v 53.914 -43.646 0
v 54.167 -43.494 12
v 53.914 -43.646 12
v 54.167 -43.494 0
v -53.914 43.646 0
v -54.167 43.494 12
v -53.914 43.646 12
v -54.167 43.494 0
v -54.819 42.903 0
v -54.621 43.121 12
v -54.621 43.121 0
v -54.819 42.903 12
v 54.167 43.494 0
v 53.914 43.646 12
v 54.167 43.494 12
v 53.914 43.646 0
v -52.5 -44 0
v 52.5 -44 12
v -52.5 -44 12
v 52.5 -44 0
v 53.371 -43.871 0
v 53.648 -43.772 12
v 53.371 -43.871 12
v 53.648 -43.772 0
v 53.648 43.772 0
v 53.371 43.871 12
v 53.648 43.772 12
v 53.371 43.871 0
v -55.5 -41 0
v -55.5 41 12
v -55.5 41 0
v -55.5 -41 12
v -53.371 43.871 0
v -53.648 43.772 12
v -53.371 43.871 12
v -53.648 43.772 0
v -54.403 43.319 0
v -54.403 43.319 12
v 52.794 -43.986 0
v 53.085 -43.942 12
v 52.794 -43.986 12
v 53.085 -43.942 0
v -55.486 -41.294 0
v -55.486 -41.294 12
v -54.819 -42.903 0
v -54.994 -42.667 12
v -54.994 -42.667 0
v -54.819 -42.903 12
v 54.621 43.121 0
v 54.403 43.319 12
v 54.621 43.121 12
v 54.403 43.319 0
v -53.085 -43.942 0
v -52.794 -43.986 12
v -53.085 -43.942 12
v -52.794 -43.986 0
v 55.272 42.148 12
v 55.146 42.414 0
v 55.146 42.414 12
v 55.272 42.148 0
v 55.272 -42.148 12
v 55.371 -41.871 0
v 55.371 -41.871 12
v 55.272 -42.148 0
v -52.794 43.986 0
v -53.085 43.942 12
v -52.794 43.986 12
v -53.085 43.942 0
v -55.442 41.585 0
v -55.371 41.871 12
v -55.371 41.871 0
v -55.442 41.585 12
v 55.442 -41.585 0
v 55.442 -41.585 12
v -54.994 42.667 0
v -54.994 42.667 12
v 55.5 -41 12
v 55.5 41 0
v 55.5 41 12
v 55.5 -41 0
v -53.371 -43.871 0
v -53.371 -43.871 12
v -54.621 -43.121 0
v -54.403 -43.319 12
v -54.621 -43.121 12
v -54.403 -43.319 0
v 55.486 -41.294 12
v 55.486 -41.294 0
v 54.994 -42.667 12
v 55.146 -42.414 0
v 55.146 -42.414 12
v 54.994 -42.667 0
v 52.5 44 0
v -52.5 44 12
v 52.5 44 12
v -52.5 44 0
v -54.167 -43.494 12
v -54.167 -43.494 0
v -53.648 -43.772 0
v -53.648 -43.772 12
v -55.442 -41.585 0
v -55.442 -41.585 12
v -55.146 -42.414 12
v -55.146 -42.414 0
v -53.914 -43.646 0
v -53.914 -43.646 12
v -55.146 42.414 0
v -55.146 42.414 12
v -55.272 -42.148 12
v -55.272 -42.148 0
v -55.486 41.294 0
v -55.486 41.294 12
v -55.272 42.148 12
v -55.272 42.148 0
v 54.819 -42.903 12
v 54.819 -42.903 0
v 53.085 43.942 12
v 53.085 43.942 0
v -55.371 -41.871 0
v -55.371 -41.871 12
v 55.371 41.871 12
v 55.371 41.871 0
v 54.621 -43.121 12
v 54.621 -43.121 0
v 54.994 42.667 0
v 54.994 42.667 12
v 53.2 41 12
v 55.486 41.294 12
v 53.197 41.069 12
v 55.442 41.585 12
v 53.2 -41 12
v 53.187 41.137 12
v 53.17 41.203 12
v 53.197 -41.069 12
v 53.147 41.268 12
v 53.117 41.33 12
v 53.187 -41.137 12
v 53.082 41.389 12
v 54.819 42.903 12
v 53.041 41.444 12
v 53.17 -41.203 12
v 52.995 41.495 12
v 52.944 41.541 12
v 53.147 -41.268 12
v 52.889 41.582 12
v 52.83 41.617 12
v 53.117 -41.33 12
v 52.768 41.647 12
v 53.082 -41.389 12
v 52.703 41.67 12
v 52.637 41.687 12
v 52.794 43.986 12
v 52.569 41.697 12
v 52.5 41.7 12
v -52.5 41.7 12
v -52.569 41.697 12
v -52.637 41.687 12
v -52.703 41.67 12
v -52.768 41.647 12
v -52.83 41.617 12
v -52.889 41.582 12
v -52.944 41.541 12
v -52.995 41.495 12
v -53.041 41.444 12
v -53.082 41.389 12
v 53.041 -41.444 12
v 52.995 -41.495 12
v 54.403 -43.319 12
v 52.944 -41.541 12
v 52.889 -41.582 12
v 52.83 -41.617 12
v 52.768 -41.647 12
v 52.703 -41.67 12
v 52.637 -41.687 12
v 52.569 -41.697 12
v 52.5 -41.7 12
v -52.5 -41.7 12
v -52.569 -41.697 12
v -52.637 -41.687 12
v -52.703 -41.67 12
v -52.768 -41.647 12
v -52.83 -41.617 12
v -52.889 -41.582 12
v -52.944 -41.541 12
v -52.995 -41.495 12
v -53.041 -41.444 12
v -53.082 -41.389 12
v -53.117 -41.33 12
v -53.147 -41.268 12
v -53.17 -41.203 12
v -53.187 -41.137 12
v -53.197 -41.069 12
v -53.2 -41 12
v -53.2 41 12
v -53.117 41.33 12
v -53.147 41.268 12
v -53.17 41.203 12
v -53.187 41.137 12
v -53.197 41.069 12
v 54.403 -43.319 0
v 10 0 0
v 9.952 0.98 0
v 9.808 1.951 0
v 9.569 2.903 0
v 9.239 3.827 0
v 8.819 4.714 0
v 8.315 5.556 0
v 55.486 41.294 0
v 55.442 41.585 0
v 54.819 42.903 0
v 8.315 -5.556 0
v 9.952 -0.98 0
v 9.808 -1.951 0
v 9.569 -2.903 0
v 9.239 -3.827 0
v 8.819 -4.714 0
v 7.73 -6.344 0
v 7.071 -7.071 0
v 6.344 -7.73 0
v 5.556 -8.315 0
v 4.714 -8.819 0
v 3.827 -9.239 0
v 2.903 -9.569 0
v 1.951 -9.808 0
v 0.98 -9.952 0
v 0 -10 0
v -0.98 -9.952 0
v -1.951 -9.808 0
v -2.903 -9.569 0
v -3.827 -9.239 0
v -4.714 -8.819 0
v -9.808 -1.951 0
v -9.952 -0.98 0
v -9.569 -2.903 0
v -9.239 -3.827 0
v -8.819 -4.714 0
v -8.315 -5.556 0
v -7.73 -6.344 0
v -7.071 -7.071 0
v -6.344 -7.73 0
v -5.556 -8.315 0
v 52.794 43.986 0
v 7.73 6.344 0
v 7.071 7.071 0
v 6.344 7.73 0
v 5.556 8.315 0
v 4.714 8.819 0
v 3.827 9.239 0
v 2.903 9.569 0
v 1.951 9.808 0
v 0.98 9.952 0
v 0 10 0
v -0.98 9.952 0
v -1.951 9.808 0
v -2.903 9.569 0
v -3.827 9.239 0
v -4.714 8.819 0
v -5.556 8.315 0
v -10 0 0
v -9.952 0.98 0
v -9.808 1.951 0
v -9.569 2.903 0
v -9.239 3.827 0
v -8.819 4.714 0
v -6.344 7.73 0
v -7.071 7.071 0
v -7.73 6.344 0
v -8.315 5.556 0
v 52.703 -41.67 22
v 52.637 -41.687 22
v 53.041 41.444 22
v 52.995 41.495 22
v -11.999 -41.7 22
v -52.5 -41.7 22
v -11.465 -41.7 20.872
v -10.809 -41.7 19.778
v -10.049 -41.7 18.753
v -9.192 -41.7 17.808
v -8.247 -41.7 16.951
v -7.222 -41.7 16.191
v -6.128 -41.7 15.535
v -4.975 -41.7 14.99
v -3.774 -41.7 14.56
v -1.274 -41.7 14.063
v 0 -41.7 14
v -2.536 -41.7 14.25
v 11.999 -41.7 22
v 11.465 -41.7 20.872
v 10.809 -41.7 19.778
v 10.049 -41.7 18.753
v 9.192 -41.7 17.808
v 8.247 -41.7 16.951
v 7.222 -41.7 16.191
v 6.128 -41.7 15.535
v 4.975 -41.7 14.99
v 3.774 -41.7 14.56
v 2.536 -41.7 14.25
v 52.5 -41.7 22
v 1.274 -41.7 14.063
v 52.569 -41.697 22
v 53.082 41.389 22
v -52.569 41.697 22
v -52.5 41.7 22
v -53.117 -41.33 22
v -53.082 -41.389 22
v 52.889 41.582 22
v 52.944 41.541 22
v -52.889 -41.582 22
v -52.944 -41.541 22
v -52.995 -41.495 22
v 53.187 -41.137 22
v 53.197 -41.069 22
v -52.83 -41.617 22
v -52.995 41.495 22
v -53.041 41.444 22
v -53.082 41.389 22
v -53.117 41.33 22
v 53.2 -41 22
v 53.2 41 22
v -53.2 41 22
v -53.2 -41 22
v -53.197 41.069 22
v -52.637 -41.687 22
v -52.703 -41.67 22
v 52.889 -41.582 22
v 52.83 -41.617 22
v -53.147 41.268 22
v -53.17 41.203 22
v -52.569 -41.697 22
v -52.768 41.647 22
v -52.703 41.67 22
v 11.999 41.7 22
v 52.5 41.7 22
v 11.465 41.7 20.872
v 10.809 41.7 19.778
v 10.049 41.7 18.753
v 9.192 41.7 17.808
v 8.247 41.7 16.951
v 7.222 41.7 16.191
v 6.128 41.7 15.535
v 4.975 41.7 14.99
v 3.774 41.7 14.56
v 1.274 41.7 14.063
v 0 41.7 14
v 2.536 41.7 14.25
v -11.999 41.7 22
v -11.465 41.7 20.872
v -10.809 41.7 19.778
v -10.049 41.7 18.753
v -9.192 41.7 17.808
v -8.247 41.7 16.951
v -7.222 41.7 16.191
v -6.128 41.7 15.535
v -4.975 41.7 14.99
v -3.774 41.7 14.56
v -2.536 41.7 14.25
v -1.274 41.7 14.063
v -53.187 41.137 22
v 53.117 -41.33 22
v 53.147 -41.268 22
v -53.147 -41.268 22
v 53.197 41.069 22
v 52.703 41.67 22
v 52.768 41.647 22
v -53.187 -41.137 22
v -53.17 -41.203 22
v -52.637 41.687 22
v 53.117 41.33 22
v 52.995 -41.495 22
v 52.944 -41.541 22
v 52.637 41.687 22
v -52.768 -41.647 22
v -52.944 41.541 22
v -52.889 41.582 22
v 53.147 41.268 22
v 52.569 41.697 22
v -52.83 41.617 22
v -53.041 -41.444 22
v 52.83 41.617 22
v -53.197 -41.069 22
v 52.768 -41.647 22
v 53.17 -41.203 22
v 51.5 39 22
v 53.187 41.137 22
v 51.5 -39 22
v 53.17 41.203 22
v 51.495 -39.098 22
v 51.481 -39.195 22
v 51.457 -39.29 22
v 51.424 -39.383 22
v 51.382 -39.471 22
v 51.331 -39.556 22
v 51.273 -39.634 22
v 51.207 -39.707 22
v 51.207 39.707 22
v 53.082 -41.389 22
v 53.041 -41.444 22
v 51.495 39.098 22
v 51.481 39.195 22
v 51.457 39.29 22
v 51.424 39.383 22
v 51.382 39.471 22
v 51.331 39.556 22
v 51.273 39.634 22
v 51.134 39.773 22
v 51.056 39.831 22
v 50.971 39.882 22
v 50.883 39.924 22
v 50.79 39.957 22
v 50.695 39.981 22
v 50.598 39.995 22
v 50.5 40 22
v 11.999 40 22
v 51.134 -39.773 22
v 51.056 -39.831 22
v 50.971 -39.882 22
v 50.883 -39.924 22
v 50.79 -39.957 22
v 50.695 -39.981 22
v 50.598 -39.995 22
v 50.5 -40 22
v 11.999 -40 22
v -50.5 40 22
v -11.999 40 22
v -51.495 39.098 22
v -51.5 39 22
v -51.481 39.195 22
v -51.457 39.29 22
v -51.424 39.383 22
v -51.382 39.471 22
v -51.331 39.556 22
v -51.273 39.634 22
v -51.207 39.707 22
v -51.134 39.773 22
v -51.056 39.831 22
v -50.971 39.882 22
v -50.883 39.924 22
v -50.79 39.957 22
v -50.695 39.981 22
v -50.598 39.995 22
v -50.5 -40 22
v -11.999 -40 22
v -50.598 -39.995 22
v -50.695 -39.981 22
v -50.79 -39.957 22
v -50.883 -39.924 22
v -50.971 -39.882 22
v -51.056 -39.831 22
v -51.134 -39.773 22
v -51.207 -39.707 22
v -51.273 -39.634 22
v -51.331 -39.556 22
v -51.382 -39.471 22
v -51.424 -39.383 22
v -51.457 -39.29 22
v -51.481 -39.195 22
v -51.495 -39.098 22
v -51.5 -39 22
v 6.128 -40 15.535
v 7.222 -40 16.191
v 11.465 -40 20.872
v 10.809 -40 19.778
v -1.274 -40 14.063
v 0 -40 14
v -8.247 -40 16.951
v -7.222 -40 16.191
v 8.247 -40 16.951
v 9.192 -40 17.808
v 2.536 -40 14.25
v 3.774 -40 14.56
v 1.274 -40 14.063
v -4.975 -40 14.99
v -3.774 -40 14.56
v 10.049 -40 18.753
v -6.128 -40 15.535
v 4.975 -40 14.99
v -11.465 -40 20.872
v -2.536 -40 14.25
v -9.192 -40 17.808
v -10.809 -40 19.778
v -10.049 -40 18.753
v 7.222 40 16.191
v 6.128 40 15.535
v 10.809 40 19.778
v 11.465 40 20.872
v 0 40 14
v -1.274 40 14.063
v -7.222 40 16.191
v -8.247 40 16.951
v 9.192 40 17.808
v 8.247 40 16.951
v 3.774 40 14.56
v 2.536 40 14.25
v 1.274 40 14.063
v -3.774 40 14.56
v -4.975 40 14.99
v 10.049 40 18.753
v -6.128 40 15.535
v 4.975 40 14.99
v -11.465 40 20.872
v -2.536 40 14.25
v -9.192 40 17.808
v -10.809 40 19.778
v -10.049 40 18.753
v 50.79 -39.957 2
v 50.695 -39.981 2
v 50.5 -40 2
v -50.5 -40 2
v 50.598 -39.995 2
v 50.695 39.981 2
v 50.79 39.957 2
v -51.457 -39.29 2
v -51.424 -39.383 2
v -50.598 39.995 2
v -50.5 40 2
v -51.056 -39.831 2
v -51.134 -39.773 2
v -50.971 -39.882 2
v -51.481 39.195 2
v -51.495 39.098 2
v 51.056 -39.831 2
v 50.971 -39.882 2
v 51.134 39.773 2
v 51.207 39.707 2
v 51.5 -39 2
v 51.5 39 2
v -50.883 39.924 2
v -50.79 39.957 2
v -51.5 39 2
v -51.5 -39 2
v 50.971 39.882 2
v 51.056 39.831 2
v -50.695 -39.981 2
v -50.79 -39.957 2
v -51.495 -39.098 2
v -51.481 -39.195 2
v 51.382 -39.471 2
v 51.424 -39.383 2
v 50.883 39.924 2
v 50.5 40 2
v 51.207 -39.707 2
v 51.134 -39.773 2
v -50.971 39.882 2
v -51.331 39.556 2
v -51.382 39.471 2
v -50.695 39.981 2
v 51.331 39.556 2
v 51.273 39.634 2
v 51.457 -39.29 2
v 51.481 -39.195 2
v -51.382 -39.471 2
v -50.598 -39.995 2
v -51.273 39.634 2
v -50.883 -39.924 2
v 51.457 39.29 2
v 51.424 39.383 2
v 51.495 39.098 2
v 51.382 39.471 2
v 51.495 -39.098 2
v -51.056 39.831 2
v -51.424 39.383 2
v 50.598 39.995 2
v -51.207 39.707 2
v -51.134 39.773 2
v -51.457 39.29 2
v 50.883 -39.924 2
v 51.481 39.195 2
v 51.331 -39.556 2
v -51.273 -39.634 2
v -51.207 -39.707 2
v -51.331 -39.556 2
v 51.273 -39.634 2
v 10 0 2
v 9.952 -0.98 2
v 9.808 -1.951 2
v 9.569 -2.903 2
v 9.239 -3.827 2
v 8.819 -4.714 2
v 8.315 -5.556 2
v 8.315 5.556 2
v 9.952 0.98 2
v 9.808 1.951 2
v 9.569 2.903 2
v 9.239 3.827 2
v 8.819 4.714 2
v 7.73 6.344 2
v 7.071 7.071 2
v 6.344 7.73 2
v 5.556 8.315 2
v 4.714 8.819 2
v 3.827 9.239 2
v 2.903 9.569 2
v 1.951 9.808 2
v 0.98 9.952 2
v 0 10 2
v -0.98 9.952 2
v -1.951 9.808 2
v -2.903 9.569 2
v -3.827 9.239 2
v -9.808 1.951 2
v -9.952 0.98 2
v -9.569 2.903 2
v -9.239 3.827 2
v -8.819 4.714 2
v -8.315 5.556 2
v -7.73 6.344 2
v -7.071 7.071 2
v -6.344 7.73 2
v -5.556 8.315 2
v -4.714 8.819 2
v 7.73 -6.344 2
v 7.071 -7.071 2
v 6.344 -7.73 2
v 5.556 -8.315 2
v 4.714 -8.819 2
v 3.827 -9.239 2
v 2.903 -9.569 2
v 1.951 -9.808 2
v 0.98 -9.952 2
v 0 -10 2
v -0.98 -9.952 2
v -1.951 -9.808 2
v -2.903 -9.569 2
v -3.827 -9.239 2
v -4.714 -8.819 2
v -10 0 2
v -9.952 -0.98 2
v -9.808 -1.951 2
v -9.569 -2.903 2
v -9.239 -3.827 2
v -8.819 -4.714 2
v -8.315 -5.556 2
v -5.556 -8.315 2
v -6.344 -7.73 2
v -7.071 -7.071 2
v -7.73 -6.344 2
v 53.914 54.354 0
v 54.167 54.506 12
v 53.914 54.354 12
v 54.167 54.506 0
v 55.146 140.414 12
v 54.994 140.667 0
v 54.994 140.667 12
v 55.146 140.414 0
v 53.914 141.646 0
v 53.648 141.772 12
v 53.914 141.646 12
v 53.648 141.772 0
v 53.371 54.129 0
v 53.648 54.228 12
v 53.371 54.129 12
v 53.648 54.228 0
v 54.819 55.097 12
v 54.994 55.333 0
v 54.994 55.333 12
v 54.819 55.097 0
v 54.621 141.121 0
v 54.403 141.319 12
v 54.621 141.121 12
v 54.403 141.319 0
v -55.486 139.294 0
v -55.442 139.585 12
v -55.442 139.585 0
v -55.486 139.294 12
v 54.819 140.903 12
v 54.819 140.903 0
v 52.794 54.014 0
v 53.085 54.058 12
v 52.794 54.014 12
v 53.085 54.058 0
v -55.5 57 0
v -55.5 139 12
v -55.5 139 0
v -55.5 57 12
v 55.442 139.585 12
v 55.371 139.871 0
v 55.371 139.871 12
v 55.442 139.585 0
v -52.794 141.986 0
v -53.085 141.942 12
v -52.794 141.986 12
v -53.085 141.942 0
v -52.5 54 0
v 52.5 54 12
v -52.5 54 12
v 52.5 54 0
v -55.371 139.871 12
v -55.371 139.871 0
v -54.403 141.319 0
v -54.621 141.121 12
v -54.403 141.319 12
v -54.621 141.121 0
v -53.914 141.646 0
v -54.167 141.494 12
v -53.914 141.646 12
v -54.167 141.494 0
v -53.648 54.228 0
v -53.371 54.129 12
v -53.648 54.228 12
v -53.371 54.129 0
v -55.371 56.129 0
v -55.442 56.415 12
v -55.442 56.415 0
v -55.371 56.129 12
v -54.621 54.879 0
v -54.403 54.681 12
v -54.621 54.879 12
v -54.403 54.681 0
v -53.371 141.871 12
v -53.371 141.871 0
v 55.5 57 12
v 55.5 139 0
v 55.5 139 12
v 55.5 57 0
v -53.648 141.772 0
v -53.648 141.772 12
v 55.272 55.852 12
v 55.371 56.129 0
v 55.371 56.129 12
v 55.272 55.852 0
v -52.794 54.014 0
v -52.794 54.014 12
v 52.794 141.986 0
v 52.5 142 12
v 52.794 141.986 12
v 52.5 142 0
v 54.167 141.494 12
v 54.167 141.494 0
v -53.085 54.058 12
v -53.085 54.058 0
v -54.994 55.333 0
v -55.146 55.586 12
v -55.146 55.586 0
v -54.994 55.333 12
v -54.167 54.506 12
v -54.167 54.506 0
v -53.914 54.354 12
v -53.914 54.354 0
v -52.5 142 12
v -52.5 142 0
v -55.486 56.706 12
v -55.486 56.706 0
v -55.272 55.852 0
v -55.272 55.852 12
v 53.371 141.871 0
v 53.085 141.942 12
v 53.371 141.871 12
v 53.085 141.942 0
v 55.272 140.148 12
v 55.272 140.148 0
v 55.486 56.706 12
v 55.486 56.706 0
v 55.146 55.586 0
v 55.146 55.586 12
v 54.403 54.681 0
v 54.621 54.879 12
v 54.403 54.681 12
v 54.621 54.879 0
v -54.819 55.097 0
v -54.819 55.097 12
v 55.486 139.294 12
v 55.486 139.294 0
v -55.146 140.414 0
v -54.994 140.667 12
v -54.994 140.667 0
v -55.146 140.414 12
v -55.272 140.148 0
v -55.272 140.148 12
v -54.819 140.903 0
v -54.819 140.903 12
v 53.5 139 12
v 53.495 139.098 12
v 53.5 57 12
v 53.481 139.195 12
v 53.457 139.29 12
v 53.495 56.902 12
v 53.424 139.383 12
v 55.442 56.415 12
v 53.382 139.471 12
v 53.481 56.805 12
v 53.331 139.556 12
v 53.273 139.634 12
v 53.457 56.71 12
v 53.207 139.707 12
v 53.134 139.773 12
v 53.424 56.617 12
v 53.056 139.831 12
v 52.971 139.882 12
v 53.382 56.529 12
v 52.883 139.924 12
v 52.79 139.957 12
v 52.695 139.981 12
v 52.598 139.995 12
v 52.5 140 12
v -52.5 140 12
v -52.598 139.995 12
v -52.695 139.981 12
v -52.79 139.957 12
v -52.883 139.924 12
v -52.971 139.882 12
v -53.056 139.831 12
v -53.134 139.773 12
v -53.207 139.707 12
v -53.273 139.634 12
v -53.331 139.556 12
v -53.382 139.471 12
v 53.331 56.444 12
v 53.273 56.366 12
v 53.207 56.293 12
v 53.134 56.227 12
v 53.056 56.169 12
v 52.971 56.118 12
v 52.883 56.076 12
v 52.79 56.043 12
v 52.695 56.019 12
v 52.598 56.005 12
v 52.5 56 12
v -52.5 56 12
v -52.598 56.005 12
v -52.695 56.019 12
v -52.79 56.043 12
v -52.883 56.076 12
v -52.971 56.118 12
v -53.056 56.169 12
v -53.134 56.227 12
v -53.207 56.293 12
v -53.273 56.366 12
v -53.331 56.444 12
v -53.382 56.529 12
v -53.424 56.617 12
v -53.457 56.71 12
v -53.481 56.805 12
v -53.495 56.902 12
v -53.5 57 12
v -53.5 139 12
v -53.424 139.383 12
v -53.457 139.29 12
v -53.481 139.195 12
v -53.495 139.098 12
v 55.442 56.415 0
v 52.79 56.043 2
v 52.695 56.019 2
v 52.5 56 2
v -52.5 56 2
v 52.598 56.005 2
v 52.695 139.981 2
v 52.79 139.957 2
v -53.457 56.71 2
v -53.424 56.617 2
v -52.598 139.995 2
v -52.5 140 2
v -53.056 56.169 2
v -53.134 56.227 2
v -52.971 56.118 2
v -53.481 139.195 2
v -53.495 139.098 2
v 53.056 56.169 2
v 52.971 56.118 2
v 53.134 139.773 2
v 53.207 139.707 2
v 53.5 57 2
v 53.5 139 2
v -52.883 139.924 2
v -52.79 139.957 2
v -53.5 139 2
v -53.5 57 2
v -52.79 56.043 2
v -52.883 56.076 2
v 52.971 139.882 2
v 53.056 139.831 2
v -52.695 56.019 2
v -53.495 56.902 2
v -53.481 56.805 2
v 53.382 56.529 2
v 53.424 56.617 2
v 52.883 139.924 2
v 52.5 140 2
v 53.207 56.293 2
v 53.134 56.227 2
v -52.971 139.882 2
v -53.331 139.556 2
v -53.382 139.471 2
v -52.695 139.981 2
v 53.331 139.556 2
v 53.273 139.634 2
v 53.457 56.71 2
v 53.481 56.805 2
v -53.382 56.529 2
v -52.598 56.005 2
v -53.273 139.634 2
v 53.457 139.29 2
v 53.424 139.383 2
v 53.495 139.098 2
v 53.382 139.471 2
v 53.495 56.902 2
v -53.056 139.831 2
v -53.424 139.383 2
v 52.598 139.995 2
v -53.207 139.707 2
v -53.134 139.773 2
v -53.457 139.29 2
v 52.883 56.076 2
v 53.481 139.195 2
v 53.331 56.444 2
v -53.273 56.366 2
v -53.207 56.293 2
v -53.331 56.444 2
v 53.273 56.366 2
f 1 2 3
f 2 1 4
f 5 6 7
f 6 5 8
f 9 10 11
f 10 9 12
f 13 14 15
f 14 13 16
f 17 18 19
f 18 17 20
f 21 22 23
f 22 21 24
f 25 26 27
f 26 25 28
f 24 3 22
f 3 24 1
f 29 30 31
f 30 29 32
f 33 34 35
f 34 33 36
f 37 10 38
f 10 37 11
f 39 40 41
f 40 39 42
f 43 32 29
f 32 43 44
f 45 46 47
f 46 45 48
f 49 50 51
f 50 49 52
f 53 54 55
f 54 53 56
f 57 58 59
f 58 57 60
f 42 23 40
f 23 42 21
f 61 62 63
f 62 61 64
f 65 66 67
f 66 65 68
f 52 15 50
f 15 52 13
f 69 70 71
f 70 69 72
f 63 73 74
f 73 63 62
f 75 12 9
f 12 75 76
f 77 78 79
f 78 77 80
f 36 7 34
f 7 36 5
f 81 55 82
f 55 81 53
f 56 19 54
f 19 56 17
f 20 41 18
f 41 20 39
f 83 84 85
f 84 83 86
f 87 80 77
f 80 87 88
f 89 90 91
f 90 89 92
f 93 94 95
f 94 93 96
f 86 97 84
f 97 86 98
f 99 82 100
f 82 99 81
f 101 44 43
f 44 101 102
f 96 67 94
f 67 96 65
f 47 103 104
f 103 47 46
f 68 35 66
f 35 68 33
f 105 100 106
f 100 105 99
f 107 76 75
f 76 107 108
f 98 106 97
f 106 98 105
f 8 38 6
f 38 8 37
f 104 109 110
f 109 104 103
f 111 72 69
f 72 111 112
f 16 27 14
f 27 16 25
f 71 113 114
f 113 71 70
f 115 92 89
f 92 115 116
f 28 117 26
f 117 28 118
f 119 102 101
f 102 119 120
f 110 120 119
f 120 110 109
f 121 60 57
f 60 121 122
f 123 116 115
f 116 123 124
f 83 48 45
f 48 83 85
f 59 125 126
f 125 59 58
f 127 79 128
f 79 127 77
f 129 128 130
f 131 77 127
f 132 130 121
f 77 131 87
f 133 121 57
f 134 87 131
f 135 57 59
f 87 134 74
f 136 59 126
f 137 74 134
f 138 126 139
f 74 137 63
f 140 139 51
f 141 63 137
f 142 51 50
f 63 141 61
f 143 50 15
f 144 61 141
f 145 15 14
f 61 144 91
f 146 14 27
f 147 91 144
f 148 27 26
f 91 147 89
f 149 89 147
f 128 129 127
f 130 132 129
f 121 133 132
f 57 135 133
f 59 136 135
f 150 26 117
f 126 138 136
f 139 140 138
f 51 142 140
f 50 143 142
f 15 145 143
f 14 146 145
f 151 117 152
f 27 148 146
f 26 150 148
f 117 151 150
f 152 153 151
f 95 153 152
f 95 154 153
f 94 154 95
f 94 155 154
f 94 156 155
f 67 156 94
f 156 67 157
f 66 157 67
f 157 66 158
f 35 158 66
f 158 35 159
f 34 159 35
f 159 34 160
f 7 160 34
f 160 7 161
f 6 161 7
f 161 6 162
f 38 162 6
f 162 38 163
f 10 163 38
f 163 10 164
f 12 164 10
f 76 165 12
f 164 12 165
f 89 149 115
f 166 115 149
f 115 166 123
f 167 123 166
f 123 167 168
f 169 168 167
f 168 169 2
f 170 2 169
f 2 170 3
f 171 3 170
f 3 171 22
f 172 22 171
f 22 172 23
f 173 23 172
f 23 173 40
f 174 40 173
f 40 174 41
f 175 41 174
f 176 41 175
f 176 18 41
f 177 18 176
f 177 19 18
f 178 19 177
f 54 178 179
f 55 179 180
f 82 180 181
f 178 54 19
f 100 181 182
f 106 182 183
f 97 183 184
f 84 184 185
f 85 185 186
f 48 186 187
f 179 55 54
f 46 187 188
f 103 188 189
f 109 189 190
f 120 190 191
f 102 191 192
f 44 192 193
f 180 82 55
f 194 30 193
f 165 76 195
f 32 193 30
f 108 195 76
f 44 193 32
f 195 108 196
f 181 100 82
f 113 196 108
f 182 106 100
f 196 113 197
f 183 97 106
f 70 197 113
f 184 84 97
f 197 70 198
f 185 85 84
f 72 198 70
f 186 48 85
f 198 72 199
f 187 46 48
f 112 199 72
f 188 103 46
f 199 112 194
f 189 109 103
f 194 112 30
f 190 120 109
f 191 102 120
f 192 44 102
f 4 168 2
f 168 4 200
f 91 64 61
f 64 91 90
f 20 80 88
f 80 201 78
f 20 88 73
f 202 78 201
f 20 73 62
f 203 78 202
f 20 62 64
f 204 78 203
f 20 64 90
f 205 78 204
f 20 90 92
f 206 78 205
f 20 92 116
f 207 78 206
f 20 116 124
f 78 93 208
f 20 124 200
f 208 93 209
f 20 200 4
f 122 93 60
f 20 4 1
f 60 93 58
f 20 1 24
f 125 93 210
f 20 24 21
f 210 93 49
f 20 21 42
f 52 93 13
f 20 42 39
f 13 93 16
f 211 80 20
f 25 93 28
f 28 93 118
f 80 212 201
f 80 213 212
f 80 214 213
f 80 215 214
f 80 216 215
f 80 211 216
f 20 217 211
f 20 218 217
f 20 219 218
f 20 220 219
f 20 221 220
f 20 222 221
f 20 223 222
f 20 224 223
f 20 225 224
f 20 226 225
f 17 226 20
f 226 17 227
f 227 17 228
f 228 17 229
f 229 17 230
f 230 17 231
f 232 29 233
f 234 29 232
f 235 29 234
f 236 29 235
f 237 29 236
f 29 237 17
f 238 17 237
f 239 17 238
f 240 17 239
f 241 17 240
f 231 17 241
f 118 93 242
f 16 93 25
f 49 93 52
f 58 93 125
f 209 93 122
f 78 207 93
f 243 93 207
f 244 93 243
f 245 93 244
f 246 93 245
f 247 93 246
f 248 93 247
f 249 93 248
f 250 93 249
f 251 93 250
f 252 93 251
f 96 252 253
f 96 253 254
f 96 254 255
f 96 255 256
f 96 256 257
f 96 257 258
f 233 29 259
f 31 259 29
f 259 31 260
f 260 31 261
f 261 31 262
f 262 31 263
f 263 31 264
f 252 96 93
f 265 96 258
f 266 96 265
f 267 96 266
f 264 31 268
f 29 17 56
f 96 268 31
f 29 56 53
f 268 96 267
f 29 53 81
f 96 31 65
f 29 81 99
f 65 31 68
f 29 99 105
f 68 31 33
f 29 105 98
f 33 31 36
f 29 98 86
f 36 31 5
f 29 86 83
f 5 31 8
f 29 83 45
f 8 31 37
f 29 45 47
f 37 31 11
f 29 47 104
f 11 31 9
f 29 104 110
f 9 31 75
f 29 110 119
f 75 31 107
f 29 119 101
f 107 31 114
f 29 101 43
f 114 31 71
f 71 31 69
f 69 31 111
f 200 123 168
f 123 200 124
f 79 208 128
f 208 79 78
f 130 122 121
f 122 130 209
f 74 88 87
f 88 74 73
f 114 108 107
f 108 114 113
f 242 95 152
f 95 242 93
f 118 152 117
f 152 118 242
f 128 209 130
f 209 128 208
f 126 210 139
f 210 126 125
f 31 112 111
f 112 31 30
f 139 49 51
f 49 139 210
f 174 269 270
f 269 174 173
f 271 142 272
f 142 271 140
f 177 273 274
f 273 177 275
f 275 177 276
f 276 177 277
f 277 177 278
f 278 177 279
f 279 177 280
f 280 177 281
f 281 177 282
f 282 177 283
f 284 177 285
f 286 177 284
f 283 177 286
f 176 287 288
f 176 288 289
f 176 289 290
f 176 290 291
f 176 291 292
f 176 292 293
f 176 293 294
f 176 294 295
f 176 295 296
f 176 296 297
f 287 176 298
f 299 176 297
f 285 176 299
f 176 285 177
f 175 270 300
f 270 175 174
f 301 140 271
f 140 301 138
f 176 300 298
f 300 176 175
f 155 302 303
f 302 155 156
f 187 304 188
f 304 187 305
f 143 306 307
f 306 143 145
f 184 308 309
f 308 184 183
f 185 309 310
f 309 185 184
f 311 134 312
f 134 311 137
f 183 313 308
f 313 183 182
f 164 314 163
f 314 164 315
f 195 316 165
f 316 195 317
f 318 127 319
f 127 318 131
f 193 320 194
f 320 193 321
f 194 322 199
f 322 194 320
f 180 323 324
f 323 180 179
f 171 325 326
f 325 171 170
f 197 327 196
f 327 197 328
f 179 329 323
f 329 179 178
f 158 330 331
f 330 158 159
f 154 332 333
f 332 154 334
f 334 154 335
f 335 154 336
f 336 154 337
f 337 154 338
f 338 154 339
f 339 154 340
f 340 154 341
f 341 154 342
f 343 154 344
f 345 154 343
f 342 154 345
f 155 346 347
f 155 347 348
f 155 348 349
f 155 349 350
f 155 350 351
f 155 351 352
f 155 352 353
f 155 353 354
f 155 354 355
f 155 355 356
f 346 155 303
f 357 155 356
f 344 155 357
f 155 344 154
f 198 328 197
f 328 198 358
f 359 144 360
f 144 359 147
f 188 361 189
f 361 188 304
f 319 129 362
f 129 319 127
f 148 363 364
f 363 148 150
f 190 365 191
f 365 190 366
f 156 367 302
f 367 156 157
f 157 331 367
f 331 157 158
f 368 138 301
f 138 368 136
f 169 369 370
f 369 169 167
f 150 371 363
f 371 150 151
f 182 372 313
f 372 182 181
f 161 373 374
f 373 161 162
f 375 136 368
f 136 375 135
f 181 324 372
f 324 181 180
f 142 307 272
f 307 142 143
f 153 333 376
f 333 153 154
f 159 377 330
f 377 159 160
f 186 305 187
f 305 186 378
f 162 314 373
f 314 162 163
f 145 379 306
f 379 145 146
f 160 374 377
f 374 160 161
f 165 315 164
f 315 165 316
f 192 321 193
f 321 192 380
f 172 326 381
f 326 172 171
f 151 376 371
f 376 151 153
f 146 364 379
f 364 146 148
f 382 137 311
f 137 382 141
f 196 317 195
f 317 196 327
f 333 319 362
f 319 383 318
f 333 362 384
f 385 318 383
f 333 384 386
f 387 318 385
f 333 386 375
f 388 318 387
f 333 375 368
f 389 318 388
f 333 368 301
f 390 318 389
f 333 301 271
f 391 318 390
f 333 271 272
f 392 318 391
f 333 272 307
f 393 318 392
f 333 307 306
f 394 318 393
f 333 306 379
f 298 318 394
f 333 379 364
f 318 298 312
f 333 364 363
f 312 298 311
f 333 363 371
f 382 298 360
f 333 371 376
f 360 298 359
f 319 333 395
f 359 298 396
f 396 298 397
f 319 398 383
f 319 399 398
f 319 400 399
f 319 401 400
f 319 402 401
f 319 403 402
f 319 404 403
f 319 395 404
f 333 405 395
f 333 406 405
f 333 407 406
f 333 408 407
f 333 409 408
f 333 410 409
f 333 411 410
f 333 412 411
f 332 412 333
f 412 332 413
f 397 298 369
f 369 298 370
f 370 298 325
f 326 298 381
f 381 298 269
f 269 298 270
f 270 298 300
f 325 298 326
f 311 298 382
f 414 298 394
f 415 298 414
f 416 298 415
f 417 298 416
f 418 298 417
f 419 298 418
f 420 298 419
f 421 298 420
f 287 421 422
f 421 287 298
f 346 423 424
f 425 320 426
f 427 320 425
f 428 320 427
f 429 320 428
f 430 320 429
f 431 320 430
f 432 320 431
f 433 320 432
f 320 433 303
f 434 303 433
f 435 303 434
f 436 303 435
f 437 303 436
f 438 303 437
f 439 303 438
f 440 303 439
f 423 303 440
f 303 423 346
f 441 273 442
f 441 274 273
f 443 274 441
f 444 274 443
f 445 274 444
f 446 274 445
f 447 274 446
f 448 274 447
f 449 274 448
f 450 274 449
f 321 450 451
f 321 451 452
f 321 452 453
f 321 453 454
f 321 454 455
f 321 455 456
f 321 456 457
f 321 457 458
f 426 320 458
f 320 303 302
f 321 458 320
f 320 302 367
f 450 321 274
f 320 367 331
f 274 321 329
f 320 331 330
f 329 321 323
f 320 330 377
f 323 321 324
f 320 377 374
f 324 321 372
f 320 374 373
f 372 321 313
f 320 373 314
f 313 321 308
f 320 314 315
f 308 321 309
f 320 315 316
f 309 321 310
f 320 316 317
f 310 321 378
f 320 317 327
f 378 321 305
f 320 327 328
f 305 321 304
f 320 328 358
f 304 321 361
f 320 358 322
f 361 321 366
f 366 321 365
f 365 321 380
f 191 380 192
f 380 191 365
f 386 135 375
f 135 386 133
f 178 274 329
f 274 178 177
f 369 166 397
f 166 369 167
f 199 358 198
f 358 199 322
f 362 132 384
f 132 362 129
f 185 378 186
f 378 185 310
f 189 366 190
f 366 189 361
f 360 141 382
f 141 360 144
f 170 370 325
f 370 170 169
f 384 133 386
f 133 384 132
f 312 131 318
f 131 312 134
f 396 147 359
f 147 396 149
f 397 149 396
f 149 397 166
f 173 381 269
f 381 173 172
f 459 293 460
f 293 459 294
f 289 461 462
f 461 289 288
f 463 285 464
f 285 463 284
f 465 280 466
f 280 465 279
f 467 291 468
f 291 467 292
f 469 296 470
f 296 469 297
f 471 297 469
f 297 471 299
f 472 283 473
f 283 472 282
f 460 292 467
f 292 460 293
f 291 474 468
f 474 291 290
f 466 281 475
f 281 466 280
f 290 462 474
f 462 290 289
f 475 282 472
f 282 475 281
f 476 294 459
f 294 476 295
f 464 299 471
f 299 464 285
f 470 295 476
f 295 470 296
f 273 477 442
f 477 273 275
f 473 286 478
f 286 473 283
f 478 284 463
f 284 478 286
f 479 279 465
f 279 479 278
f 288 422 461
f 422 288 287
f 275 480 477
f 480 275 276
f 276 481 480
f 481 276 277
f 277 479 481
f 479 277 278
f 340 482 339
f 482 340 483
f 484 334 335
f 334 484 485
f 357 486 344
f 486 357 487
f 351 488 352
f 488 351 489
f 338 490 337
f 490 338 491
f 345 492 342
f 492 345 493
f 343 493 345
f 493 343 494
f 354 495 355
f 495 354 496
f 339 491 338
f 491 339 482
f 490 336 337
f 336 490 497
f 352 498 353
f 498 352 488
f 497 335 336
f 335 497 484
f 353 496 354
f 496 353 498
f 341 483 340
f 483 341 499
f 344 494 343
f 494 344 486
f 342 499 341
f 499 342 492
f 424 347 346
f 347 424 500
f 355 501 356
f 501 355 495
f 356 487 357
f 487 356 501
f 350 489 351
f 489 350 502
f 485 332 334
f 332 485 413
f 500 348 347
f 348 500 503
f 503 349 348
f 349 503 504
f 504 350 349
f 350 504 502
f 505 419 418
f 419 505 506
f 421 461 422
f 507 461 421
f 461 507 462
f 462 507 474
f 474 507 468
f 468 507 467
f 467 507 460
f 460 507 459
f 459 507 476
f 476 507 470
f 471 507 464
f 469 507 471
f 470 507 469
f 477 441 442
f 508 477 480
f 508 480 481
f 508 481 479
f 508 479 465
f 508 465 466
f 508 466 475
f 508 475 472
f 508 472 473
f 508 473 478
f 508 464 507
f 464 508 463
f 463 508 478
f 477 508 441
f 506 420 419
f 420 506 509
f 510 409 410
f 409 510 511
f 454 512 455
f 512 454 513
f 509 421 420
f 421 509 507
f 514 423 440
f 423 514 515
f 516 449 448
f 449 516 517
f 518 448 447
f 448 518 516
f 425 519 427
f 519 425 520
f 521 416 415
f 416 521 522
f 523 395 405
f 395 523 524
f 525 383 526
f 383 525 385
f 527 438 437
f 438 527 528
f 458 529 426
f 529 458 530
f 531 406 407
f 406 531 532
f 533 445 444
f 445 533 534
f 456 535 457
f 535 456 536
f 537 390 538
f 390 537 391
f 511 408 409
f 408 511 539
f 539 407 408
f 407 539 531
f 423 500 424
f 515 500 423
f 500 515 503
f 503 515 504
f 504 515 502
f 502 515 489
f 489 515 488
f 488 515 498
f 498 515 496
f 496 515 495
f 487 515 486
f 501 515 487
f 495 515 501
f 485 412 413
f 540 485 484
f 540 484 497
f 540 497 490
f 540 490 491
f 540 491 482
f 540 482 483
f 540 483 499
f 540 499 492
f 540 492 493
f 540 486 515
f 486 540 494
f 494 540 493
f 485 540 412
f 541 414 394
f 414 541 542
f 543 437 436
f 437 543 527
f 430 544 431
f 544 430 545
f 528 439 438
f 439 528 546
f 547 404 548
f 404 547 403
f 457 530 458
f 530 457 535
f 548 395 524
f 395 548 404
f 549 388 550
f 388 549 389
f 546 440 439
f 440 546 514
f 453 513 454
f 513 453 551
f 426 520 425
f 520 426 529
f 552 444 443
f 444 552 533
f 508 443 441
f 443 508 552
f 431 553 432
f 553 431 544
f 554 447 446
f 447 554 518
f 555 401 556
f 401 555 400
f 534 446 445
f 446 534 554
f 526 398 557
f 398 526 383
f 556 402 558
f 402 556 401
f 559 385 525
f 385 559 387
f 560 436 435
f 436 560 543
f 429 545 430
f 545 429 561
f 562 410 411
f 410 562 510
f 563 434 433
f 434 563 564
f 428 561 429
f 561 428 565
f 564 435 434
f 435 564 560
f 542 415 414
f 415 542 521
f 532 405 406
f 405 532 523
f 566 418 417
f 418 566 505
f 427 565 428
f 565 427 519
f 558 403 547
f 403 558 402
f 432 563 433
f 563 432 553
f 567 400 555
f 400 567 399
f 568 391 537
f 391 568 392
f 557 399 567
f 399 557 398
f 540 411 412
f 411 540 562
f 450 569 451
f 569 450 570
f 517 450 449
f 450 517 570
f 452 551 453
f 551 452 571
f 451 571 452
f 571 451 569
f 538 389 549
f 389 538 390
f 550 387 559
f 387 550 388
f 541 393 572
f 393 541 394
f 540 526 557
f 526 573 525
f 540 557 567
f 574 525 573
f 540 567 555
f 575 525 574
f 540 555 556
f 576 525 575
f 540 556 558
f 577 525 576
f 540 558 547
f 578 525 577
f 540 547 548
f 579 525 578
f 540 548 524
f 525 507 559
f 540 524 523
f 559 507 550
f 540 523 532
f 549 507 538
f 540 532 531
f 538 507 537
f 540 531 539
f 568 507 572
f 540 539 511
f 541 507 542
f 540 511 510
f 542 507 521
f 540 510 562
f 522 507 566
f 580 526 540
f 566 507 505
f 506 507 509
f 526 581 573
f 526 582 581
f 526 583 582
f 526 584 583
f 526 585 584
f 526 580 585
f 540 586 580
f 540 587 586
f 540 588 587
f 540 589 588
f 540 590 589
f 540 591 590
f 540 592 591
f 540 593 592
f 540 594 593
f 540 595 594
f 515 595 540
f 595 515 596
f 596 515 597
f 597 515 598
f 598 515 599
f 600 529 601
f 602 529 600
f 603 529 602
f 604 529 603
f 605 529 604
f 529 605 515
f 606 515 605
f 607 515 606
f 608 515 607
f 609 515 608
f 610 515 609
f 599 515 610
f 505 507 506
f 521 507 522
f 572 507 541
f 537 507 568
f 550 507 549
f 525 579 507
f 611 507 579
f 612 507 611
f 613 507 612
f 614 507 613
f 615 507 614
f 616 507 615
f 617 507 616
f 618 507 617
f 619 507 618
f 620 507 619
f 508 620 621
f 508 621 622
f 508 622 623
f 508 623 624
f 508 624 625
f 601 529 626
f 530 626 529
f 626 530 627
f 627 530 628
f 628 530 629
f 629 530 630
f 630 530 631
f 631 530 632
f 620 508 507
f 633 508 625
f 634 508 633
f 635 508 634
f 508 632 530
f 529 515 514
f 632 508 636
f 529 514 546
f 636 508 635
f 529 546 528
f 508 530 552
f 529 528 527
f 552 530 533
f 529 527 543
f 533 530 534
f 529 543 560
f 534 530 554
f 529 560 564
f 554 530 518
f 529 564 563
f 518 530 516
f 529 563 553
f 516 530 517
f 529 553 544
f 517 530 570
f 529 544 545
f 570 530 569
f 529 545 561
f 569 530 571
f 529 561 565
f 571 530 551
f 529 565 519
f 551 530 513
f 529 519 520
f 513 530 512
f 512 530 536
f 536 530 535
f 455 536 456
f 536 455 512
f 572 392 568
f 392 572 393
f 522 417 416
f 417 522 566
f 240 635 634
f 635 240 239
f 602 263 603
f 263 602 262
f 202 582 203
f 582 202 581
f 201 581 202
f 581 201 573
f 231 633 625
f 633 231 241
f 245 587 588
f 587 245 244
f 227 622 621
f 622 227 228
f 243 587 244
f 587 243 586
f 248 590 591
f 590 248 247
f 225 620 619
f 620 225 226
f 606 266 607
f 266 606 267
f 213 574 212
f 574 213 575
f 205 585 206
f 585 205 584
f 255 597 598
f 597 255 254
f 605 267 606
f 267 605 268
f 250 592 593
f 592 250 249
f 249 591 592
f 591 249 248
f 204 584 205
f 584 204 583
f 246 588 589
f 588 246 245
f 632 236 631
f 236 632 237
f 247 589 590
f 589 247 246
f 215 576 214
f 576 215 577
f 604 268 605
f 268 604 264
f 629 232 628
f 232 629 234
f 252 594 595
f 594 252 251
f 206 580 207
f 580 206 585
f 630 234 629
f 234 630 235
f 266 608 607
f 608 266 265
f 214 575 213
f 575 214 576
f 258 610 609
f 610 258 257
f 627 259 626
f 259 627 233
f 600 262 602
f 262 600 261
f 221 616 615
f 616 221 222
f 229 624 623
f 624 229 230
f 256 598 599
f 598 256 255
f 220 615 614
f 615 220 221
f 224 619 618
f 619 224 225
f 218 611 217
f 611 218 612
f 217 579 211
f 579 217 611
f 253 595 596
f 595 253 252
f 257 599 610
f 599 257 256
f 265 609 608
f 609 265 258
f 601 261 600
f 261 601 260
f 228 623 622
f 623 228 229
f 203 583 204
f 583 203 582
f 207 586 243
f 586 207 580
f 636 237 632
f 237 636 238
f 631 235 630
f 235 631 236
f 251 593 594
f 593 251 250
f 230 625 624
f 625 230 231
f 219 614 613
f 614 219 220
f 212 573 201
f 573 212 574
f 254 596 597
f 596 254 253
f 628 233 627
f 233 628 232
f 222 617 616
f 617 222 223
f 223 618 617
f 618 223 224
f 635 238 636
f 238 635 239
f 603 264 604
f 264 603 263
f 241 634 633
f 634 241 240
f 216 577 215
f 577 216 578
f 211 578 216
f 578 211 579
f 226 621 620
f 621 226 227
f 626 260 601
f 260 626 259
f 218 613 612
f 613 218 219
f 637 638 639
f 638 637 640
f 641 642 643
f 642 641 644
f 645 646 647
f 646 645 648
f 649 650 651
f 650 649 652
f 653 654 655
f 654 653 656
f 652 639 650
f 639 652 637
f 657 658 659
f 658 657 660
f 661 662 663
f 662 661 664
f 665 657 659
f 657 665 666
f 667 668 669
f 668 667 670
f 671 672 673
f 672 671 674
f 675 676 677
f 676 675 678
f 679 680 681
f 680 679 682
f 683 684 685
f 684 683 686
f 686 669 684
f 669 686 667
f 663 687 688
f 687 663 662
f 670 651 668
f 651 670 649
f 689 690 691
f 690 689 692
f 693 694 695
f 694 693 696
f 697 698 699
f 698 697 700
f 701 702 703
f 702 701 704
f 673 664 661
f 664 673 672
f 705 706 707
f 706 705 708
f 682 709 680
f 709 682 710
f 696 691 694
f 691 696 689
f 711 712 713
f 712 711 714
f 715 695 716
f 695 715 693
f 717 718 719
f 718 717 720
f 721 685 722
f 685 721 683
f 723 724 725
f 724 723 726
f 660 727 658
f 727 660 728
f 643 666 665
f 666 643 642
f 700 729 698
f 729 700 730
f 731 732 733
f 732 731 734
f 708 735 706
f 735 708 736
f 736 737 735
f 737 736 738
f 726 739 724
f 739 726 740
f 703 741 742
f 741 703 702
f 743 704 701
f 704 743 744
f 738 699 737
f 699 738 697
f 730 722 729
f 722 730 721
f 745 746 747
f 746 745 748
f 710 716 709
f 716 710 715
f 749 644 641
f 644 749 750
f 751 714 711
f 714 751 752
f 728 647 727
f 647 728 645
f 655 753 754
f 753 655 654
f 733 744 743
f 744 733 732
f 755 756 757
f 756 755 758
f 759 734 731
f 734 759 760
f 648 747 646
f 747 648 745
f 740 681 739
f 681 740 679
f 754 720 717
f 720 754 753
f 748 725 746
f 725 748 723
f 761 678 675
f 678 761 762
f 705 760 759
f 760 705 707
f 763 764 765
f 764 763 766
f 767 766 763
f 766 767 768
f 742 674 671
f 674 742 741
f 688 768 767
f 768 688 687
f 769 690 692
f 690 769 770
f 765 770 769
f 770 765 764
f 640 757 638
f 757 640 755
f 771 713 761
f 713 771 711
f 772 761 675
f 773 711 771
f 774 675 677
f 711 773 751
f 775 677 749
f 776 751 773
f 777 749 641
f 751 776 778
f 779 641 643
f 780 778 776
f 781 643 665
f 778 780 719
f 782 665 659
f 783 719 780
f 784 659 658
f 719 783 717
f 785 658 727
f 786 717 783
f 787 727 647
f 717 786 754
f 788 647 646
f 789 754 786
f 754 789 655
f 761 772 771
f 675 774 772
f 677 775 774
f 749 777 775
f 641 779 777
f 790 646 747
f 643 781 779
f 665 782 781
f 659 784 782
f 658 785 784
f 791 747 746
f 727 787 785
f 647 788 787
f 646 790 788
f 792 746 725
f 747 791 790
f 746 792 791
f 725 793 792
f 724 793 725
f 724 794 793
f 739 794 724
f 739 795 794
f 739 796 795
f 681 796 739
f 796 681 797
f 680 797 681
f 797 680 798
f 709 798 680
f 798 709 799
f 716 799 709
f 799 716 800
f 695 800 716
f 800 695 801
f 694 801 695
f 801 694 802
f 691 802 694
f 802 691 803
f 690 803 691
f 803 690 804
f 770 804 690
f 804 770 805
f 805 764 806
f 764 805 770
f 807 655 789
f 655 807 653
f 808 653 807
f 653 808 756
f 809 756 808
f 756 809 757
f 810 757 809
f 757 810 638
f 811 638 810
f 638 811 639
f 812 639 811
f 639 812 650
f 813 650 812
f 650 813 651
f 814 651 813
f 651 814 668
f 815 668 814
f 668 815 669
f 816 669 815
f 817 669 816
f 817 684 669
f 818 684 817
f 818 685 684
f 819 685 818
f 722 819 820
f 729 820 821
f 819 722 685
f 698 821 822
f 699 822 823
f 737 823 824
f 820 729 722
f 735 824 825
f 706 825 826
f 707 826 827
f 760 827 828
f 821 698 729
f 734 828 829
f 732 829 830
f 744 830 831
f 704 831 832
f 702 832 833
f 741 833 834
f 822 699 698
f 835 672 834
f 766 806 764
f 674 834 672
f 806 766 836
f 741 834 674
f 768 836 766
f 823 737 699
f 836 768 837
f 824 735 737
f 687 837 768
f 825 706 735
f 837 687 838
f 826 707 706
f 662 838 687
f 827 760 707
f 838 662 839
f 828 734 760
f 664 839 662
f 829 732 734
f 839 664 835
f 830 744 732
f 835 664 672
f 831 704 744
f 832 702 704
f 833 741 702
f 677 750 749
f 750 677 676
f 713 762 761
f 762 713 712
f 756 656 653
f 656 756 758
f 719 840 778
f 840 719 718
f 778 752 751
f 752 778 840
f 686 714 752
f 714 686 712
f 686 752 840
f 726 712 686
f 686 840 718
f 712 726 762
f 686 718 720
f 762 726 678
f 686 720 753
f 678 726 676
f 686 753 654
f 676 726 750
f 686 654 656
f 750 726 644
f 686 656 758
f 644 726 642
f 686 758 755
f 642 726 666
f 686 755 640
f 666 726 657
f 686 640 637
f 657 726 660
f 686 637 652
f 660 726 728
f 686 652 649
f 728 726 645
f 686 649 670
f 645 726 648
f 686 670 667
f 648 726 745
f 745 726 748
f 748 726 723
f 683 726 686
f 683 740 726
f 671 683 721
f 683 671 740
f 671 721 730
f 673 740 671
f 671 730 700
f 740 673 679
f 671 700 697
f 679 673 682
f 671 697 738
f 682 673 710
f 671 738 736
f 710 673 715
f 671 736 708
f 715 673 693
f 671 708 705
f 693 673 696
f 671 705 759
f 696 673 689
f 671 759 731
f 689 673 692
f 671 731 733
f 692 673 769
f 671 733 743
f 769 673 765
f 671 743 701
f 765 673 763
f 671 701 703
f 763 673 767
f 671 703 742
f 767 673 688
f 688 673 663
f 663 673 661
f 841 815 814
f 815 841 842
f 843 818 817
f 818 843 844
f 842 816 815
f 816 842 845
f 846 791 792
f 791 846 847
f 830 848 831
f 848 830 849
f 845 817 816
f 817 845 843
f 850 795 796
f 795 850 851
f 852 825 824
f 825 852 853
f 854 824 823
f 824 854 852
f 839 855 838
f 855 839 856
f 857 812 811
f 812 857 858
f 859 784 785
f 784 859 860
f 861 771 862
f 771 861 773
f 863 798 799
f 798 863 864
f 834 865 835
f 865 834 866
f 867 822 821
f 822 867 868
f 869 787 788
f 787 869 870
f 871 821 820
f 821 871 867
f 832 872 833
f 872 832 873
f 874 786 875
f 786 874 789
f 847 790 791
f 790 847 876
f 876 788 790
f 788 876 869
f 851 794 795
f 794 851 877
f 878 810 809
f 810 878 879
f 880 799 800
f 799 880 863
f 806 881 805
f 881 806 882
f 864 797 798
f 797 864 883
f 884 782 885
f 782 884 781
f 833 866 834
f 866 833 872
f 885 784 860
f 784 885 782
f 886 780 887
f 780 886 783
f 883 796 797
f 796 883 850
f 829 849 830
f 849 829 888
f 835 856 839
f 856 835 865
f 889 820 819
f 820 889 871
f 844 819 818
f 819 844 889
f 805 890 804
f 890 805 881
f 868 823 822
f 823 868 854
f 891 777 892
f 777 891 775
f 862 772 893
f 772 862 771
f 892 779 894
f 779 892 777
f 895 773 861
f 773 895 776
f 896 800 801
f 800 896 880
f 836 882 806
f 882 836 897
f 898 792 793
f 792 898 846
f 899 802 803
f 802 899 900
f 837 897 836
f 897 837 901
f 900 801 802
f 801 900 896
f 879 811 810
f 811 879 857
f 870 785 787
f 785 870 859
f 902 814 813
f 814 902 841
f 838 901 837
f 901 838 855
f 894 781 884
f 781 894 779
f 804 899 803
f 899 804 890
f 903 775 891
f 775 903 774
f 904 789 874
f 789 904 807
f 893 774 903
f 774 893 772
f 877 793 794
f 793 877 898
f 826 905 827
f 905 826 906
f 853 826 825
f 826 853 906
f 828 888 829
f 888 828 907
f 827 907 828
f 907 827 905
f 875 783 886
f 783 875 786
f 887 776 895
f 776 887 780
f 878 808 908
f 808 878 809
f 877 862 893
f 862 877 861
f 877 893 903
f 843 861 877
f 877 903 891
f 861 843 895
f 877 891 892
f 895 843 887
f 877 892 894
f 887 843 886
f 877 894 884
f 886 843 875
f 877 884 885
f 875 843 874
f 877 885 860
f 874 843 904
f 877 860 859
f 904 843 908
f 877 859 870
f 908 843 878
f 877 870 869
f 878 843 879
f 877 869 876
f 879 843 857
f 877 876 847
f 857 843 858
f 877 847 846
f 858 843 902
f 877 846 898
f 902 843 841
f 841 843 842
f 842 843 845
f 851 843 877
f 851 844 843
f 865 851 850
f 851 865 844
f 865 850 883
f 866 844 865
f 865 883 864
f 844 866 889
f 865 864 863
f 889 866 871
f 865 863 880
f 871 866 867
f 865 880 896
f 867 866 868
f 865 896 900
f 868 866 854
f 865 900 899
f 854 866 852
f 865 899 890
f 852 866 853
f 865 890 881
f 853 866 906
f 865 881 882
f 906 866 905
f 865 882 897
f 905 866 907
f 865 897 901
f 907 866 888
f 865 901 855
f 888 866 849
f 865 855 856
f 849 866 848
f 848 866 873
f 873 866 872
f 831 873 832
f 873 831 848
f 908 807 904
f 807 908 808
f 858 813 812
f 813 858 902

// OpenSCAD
// Caixa de transporte para 10 top loaders, com tampa de encaixe
// Espaco interno: 103 x 80 x 20 mm. Todas as medidas em mm.

/* [O que mostrar] */
parte = "tudo"; // [tudo, impressao, corpo, tampa, montado]
espaco_pecas = 10;     // distancia entre corpo e tampa no modo impressao
mostrar_cards = false;

/* [Espaco interno] */
int_larg = 103;
int_prof = 80;
int_alt  = 20;
int_raio = 1.0;        // cantos internos

/* [Paredes e encaixe] */
margem = 4.0;          // parede externa (parte de baixo)
piso = 2.0;
degrau_h = 10.0;       // altura do encaixe da tampa
tampa_parede = 2.0;
tampa_topo = 2.0;
folga_tampa = 0.3;
raio = 3.0;            // cantos externos

/* [Recorte para os dedos] */
usar_recorte = true;
recorte_larg = 26;
recorte_prof = 8;      // menor que degrau_h para a tampa cobrir tudo

/* [Furo no fundo (empurrar os top loaders para cima)] */
furo_fundo_d = 20;     // 0 = sem furo
furo_fundo_x = 0;      // posicao a partir do centro
furo_fundo_y = 0;

/* [Gravacao na tampa] */
texto = "";            // ex.: "TOP LOADERS" (vazio = sem gravacao)
texto_tamanho = 12;
texto_profundidade = 0.6;
texto_fonte = "Liberation Sans:style=Bold";

$fn = 64;

// ---------- Valores calculados ----------
W = int_larg + 2 * margem;
D = int_prof + 2 * margem;
corpo_h = piso + int_alt;
base_h = corpo_h - degrau_h;
inset = tampa_parede + folga_tampa;
tampa_h = degrau_h + tampa_topo;

echo(str("Caixa: ", W, " x ", D, " mm | corpo ", corpo_h, " mm | tampa ", tampa_h,
         " mm | fechada ", base_h + tampa_h, " mm | parede no encaixe ", margem - inset, " mm"));

// ---------- Blocos ----------
module retangulo_arredondado(w, d, r) {
    offset(r = r) square([w - 2 * r, d - 2 * r], center = true);
}

module bloco(w, d, h, r) {
    linear_extrude(h) retangulo_arredondado(w, d, max(r, 0.01));
}

// ---------- Corpo ----------
module corpo() {
    difference() {
        union() {
            bloco(W, D, base_h, raio);
            bloco(W - 2 * inset, D - 2 * inset, corpo_h, raio - inset);
        }
        // espaco interno
        translate([0, 0, piso]) bloco(int_larg, int_prof, corpo_h, int_raio);
        // furo no fundo
        if (furo_fundo_d > 0)
            translate([furo_fundo_x, furo_fundo_y, -1]) cylinder(d = furo_fundo_d, h = piso + 2);
        // recortes em U nas laterais compridas
        if (usar_recorte)
            for (s = [-1, 1])
                // fundo do U fica recorte_prof abaixo do topo; corta so a parede
                translate([0, s * D / 2, corpo_h - recorte_prof + recorte_larg / 2])
                    rotate([90, 0, 0])
                        linear_extrude(margem * 3, center = true)
                            hull() {
                                circle(d = recorte_larg);
                                translate([-recorte_larg / 2, 0]) square([recorte_larg, recorte_prof + 1]);
                            }
    }
}

// ---------- Tampa (de cabeca para baixo, pronta para imprimir) ----------
module tampa() {
    difference() {
        bloco(W, D, tampa_h, raio);
        translate([0, 0, tampa_topo])
            bloco(W - 2 * tampa_parede, D - 2 * tampa_parede, tampa_h, raio - tampa_parede);
        if (texto != "")
            translate([0, 0, -0.01])
                linear_extrude(texto_profundidade + 0.01)
                    mirror([1, 0, 0])
                        text(texto, size = texto_tamanho, font = texto_fonte,
                             halign = "center", valign = "center");
    }
}

// top loaders de referencia (aprox. 101 x 77 x 1.5 mm cada)
module cards() {
    color("white", 0.6)
        for (i = [0 : 9])
            translate([0, 0, piso + i * 2 + 0.25])
                linear_extrude(1.5) retangulo_arredondado(101, 77, 2);
}

// ---------- Saida ----------
if (parte == "impressao") {
    translate([0, -(D + espaco_pecas) / 2, 0]) corpo();
    translate([0,  (D + espaco_pecas) / 2, 0]) tampa();
} else if (parte == "corpo") {
    corpo();
} else if (parte == "tampa") {
    tampa();
} else if (parte == "montado") {
    color("SteelBlue") corpo();
    color("LightSteelBlue", 0.5)
        translate([0, 0, base_h + tampa_h]) rotate([0, 180, 0]) tampa();
    if (mostrar_cards) cards();
} else {
    color("SteelBlue") corpo();
    if (mostrar_cards) cards();
    color("LightSteelBlue") translate([0, D + 10, 0]) tampa();
}
